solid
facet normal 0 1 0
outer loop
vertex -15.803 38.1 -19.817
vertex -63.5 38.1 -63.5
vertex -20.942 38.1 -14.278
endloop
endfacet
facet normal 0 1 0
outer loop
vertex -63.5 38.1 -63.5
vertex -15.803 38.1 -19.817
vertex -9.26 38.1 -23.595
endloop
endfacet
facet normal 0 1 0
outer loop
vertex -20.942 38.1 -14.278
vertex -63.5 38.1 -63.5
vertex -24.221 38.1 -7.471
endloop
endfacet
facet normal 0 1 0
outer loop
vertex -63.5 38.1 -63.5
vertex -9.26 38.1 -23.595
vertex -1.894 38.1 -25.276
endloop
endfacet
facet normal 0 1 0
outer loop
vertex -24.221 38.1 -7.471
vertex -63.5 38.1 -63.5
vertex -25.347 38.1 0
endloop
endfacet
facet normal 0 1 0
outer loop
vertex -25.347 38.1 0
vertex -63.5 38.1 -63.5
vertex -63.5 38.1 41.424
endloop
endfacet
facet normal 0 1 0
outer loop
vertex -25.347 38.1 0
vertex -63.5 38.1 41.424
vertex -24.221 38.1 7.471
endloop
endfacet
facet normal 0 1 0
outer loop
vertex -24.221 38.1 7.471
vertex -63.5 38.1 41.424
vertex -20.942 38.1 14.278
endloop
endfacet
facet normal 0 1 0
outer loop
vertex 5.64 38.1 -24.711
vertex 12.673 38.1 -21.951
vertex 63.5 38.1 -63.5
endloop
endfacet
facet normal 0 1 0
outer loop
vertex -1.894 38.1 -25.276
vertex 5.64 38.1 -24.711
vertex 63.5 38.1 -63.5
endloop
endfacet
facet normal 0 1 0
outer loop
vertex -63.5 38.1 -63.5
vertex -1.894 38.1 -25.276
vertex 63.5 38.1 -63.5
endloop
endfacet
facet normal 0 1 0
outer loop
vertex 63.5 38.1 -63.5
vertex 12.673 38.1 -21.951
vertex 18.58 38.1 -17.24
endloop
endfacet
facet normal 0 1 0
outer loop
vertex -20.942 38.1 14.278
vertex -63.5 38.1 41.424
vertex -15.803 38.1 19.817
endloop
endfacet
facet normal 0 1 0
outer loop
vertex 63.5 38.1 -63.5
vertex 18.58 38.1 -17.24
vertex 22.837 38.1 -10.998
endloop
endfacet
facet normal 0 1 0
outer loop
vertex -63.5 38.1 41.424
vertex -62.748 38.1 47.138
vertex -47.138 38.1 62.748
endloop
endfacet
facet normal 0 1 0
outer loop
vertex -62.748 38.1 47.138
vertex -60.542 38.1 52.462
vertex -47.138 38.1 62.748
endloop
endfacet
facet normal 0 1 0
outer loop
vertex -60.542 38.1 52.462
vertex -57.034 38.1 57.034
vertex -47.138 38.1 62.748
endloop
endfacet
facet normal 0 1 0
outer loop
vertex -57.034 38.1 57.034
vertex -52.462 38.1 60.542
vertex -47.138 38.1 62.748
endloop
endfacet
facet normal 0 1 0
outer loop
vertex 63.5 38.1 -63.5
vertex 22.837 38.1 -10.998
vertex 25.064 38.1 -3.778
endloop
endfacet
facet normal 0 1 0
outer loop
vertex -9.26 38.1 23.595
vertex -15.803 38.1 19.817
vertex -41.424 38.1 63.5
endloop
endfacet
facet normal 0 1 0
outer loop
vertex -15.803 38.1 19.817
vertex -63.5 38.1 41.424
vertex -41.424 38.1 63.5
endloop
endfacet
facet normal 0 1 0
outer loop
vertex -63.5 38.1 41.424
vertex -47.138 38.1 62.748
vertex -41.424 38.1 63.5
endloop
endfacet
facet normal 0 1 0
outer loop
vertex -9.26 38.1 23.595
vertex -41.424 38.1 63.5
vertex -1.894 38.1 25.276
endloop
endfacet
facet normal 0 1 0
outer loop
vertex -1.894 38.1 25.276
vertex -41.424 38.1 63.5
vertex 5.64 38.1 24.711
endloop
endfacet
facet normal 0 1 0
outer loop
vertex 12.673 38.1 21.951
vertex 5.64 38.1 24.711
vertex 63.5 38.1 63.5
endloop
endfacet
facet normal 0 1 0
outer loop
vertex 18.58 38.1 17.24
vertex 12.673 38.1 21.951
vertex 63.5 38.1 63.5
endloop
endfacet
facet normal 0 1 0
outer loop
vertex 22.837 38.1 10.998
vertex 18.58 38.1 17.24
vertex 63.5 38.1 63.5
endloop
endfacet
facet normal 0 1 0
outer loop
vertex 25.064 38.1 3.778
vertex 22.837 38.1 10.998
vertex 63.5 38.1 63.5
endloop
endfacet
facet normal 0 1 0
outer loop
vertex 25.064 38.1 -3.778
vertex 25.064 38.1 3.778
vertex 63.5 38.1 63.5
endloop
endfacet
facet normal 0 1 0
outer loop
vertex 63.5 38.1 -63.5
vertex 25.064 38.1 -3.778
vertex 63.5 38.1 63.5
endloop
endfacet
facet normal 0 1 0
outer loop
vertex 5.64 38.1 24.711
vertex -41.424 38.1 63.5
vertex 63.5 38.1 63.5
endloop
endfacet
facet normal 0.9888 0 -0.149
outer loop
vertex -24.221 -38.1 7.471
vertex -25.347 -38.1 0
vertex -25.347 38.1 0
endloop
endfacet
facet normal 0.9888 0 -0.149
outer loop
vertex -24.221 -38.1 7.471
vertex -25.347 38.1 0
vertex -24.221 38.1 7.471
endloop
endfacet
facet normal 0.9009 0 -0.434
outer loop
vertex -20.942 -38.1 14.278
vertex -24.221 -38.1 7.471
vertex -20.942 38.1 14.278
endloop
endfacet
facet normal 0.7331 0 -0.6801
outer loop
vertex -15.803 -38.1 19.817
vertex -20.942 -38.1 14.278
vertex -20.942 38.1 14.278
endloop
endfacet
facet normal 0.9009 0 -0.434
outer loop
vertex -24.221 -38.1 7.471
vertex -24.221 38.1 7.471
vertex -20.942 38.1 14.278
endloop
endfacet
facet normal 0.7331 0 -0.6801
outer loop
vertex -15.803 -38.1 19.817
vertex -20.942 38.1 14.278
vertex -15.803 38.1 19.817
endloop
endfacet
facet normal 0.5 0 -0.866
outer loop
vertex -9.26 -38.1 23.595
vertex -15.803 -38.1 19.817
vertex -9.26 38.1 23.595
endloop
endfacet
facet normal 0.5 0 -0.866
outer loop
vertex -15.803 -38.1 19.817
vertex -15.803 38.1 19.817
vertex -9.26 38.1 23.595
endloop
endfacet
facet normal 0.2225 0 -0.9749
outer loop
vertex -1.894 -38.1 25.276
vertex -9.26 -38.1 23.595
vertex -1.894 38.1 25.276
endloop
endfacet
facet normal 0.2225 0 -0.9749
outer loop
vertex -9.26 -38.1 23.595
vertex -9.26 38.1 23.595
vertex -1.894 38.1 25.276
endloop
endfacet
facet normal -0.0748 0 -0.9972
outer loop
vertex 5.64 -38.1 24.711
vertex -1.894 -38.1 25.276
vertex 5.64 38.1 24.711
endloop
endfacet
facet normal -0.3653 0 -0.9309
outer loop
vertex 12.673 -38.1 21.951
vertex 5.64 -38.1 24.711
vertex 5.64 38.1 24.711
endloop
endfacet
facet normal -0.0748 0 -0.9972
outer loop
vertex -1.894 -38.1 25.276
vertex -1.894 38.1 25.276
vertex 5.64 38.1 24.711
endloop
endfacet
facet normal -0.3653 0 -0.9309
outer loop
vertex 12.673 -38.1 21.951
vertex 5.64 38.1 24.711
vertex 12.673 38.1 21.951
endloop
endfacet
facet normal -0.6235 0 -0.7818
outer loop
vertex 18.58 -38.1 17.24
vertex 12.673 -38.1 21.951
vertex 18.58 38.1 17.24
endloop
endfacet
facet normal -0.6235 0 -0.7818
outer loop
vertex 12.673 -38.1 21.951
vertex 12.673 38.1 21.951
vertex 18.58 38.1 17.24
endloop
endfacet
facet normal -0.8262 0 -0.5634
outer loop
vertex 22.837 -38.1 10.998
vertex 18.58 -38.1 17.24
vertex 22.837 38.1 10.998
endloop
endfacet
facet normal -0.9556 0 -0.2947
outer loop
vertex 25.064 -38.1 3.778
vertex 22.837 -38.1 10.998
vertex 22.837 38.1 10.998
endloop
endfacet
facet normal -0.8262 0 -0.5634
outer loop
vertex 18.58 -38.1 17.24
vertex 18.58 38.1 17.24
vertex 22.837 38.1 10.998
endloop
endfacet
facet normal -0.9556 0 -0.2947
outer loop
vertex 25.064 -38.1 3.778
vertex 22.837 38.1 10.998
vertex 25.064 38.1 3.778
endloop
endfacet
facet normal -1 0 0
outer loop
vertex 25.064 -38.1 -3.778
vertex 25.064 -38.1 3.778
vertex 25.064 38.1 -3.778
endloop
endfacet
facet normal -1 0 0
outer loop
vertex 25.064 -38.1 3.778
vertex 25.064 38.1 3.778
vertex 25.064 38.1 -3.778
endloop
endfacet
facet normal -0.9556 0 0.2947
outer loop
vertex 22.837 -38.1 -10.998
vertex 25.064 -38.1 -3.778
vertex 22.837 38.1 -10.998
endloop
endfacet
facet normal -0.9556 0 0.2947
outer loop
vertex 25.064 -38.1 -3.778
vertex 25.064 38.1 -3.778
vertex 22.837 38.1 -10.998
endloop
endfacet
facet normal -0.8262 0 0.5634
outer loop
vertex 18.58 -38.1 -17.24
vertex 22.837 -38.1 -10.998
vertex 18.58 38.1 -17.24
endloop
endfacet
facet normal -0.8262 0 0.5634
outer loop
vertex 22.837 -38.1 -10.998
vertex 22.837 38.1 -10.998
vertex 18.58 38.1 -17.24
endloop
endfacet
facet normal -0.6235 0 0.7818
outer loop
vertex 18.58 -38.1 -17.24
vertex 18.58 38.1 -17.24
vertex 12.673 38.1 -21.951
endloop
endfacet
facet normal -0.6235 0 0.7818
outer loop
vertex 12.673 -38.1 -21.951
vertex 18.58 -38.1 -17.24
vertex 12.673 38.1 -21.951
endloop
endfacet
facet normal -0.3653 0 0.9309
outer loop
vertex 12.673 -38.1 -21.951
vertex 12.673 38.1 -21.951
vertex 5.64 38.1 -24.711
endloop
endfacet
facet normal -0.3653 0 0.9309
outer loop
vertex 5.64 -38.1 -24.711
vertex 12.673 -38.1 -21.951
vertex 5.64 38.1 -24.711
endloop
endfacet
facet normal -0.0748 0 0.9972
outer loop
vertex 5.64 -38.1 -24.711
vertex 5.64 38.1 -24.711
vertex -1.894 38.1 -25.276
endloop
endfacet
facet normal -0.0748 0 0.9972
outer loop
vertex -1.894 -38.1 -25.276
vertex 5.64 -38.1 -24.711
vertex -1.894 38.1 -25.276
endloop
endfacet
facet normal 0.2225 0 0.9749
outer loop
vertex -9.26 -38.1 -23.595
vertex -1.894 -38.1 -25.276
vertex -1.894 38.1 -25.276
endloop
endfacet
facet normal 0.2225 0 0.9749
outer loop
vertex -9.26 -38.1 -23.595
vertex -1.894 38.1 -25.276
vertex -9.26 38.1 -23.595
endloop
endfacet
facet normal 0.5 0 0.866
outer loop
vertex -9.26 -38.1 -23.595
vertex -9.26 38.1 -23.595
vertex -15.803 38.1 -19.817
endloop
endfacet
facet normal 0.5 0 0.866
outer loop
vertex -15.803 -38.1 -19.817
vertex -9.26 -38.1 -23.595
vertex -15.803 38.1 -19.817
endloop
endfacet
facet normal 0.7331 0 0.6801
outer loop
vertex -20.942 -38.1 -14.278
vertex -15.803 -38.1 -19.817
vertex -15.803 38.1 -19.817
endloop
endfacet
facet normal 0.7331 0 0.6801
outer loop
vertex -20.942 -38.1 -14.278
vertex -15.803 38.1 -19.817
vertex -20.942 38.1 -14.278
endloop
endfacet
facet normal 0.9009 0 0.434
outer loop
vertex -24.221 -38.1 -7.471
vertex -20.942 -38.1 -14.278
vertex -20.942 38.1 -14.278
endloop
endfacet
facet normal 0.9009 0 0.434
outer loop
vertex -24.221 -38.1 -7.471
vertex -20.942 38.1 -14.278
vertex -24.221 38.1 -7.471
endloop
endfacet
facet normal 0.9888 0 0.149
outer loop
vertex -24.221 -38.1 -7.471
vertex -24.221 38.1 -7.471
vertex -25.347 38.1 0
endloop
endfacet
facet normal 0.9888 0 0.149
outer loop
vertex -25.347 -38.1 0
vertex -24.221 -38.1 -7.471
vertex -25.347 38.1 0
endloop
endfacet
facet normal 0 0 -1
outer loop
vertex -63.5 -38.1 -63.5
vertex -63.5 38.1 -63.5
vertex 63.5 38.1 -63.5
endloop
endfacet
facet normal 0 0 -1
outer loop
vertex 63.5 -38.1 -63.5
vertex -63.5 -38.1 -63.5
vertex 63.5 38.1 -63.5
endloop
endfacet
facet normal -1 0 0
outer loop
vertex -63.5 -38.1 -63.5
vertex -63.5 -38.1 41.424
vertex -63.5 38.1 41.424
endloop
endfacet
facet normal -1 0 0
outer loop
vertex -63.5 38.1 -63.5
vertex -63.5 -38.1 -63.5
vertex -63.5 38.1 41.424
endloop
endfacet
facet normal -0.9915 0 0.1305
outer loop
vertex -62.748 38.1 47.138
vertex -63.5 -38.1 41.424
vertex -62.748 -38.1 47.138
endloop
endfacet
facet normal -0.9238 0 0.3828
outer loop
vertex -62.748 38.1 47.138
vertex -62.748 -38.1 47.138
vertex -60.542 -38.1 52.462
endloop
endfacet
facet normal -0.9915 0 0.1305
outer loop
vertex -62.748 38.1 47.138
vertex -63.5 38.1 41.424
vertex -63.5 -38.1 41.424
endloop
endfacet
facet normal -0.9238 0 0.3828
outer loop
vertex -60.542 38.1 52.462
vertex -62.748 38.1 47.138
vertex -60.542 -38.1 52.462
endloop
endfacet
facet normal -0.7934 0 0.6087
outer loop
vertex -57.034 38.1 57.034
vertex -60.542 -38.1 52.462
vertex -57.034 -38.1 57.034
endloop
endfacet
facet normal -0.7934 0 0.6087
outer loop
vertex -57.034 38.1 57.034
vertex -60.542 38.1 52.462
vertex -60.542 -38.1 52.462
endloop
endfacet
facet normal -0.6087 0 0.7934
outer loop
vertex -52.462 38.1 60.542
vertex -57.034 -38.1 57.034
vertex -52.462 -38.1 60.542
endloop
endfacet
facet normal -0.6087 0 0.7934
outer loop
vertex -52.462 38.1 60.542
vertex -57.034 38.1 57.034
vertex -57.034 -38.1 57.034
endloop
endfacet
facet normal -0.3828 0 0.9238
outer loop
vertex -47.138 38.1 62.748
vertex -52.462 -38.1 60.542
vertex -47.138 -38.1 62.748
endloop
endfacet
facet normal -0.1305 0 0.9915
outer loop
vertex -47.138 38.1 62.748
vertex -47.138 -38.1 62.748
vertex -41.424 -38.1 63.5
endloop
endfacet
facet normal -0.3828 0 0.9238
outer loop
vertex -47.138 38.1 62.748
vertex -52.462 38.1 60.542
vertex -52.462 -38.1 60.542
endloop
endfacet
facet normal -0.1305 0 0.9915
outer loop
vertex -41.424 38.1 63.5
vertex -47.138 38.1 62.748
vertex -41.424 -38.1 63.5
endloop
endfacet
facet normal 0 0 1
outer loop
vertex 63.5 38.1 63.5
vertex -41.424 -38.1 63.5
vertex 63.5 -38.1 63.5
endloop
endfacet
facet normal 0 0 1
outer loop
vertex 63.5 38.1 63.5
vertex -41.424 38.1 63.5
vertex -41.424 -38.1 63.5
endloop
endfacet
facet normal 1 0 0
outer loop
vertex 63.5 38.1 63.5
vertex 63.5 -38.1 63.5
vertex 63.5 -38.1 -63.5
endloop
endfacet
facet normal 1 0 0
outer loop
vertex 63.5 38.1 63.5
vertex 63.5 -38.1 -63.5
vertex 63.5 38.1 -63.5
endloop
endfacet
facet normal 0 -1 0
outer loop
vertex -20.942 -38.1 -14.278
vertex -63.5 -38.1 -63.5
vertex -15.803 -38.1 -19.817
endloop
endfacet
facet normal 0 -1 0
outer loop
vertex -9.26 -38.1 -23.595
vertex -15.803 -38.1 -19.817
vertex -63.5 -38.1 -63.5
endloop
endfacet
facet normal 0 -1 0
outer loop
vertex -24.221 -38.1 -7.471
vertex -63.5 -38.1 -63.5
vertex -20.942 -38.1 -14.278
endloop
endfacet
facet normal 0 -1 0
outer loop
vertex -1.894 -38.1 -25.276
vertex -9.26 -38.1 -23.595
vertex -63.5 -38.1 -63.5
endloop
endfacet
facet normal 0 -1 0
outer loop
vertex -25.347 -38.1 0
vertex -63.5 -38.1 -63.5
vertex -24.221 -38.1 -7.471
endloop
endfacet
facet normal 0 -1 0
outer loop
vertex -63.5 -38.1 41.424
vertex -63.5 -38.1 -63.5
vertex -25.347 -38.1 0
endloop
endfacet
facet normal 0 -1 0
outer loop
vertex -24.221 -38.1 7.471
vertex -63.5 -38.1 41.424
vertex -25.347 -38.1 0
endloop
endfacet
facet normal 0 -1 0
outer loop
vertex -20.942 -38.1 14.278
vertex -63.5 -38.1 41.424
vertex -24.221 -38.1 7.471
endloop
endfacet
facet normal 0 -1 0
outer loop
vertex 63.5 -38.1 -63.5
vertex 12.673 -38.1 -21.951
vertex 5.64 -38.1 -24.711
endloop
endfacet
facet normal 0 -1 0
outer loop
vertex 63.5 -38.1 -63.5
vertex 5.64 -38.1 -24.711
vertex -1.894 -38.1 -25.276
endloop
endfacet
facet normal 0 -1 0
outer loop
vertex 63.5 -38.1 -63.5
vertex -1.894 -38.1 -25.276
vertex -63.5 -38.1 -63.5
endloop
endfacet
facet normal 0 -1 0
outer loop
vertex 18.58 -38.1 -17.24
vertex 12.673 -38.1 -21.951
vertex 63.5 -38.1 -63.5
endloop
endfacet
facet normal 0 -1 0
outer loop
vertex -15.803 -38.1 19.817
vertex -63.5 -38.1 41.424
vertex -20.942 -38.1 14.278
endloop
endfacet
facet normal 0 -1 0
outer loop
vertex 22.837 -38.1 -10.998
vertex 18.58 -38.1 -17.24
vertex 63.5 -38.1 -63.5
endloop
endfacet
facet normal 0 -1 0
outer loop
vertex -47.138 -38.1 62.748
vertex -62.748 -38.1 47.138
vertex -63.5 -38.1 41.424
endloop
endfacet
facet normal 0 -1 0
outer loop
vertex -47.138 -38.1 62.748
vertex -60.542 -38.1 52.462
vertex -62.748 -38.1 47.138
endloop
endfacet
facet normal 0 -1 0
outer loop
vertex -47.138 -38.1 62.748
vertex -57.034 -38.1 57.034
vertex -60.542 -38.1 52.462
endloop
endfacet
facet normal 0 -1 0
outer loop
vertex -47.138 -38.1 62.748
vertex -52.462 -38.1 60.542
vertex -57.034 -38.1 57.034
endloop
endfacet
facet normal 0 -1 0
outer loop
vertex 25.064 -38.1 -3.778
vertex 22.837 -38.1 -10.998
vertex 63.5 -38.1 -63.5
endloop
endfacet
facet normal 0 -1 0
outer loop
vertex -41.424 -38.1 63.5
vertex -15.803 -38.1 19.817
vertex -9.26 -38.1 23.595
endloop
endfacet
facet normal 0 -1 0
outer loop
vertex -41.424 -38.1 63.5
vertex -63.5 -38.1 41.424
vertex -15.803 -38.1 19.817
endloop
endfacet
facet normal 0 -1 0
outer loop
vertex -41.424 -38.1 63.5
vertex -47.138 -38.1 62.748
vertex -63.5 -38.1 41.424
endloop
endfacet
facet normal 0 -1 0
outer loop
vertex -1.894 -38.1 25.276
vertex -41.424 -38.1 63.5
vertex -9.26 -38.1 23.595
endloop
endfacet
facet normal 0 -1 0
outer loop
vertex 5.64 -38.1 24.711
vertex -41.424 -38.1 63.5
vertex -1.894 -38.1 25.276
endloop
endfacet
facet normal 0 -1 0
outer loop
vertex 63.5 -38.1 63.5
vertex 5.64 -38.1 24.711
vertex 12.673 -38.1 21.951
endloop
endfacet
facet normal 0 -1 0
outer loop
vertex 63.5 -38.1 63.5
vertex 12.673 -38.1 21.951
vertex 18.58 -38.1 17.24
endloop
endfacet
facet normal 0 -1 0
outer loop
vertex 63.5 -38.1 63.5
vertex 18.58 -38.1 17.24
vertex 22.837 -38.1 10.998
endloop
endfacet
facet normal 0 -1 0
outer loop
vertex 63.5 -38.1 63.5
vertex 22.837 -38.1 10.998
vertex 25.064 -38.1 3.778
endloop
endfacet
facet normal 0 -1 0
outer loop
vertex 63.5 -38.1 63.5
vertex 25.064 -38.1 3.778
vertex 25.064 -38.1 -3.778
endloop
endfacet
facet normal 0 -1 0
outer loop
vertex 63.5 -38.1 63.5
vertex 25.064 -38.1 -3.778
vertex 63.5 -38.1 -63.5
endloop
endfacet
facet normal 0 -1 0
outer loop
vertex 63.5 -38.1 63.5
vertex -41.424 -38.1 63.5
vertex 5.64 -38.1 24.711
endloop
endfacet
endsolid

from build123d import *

# Parameters (mm, degrees)
F0_W     = 127
F0_H     = 76.2
F1_DEPTH = 63.5
F2_R     = 22.075569
F3_R     = 25.34667
F4_DEPTH = 76.201


with BuildPart() as f1:
    # F0 (on Top) → F1 (new body, symmetric)
    with BuildSketch(Plane.XY):
        Rectangle(F0_W, F0_H)
    extrude(amount=F1_DEPTH, both=True)

    # F2
    f2_edges = [f1.edges().sort_by_distance(p)[0] for p in [
        (-63.5, 0, 63.5),
    ]]
    fillet(f2_edges, radius=F2_R)

    # F3 (on face) → F4 (cut, through all)
    with BuildSketch(Plane(origin=(0, 38.1, 0), x_dir=(-1, 0, 0), z_dir=(0, 1, 0))):
        Circle(F3_R)
    extrude(amount=-F4_DEPTH, mode=Mode.SUBTRACT)


solid = f1.part
